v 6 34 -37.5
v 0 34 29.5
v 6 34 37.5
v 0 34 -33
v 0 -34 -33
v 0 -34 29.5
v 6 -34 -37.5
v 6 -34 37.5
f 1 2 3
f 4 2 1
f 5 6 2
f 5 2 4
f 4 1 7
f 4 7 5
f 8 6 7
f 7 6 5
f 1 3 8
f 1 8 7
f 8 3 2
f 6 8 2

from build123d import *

# Parameters (mm, degrees)
SKETCH1_W           = 75
SKETCH1_H           = 68
BOSS_EXTRUDE1_DEPTH = 6
CUT_EXTRUDE1_DEPTH  = 78.886134838
CUT_EXTRUDE2_DEPTH  = 78.886134838


with BuildPart() as part:
    # Sketch1 → Boss-Extrude1 (new body)
    with BuildSketch(Plane(origin=(0, 0, 0), x_dir=(0, 0, -1), z_dir=(1, 0, 0))):
        Rectangle(SKETCH1_W, SKETCH1_H)
    extrude(amount=BOSS_EXTRUDE1_DEPTH)

    # Sketch2 → Cut-Extrude1 (cut, through all)
    with BuildSketch(Plane(origin=(0, 34, 0), x_dir=(1, 0, 0), z_dir=(0, 1, 0))):
        Polygon((6, 37.5), (0, 33), (0, 37.5), align=None)
    extrude(amount=-CUT_EXTRUDE1_DEPTH, mode=Mode.SUBTRACT)

    # Sketch3 → Cut-Extrude2 (cut, through all)
    with BuildSketch(Plane(origin=(0, 34, 0), x_dir=(1, 0, 0), z_dir=(0, 1, 0))):
        Polygon((6, -37.5), (0, -29.5), (0, -37.5), align=None)
    extrude(amount=-CUT_EXTRUDE2_DEPTH, mode=Mode.SUBTRACT)


solid = part.part
